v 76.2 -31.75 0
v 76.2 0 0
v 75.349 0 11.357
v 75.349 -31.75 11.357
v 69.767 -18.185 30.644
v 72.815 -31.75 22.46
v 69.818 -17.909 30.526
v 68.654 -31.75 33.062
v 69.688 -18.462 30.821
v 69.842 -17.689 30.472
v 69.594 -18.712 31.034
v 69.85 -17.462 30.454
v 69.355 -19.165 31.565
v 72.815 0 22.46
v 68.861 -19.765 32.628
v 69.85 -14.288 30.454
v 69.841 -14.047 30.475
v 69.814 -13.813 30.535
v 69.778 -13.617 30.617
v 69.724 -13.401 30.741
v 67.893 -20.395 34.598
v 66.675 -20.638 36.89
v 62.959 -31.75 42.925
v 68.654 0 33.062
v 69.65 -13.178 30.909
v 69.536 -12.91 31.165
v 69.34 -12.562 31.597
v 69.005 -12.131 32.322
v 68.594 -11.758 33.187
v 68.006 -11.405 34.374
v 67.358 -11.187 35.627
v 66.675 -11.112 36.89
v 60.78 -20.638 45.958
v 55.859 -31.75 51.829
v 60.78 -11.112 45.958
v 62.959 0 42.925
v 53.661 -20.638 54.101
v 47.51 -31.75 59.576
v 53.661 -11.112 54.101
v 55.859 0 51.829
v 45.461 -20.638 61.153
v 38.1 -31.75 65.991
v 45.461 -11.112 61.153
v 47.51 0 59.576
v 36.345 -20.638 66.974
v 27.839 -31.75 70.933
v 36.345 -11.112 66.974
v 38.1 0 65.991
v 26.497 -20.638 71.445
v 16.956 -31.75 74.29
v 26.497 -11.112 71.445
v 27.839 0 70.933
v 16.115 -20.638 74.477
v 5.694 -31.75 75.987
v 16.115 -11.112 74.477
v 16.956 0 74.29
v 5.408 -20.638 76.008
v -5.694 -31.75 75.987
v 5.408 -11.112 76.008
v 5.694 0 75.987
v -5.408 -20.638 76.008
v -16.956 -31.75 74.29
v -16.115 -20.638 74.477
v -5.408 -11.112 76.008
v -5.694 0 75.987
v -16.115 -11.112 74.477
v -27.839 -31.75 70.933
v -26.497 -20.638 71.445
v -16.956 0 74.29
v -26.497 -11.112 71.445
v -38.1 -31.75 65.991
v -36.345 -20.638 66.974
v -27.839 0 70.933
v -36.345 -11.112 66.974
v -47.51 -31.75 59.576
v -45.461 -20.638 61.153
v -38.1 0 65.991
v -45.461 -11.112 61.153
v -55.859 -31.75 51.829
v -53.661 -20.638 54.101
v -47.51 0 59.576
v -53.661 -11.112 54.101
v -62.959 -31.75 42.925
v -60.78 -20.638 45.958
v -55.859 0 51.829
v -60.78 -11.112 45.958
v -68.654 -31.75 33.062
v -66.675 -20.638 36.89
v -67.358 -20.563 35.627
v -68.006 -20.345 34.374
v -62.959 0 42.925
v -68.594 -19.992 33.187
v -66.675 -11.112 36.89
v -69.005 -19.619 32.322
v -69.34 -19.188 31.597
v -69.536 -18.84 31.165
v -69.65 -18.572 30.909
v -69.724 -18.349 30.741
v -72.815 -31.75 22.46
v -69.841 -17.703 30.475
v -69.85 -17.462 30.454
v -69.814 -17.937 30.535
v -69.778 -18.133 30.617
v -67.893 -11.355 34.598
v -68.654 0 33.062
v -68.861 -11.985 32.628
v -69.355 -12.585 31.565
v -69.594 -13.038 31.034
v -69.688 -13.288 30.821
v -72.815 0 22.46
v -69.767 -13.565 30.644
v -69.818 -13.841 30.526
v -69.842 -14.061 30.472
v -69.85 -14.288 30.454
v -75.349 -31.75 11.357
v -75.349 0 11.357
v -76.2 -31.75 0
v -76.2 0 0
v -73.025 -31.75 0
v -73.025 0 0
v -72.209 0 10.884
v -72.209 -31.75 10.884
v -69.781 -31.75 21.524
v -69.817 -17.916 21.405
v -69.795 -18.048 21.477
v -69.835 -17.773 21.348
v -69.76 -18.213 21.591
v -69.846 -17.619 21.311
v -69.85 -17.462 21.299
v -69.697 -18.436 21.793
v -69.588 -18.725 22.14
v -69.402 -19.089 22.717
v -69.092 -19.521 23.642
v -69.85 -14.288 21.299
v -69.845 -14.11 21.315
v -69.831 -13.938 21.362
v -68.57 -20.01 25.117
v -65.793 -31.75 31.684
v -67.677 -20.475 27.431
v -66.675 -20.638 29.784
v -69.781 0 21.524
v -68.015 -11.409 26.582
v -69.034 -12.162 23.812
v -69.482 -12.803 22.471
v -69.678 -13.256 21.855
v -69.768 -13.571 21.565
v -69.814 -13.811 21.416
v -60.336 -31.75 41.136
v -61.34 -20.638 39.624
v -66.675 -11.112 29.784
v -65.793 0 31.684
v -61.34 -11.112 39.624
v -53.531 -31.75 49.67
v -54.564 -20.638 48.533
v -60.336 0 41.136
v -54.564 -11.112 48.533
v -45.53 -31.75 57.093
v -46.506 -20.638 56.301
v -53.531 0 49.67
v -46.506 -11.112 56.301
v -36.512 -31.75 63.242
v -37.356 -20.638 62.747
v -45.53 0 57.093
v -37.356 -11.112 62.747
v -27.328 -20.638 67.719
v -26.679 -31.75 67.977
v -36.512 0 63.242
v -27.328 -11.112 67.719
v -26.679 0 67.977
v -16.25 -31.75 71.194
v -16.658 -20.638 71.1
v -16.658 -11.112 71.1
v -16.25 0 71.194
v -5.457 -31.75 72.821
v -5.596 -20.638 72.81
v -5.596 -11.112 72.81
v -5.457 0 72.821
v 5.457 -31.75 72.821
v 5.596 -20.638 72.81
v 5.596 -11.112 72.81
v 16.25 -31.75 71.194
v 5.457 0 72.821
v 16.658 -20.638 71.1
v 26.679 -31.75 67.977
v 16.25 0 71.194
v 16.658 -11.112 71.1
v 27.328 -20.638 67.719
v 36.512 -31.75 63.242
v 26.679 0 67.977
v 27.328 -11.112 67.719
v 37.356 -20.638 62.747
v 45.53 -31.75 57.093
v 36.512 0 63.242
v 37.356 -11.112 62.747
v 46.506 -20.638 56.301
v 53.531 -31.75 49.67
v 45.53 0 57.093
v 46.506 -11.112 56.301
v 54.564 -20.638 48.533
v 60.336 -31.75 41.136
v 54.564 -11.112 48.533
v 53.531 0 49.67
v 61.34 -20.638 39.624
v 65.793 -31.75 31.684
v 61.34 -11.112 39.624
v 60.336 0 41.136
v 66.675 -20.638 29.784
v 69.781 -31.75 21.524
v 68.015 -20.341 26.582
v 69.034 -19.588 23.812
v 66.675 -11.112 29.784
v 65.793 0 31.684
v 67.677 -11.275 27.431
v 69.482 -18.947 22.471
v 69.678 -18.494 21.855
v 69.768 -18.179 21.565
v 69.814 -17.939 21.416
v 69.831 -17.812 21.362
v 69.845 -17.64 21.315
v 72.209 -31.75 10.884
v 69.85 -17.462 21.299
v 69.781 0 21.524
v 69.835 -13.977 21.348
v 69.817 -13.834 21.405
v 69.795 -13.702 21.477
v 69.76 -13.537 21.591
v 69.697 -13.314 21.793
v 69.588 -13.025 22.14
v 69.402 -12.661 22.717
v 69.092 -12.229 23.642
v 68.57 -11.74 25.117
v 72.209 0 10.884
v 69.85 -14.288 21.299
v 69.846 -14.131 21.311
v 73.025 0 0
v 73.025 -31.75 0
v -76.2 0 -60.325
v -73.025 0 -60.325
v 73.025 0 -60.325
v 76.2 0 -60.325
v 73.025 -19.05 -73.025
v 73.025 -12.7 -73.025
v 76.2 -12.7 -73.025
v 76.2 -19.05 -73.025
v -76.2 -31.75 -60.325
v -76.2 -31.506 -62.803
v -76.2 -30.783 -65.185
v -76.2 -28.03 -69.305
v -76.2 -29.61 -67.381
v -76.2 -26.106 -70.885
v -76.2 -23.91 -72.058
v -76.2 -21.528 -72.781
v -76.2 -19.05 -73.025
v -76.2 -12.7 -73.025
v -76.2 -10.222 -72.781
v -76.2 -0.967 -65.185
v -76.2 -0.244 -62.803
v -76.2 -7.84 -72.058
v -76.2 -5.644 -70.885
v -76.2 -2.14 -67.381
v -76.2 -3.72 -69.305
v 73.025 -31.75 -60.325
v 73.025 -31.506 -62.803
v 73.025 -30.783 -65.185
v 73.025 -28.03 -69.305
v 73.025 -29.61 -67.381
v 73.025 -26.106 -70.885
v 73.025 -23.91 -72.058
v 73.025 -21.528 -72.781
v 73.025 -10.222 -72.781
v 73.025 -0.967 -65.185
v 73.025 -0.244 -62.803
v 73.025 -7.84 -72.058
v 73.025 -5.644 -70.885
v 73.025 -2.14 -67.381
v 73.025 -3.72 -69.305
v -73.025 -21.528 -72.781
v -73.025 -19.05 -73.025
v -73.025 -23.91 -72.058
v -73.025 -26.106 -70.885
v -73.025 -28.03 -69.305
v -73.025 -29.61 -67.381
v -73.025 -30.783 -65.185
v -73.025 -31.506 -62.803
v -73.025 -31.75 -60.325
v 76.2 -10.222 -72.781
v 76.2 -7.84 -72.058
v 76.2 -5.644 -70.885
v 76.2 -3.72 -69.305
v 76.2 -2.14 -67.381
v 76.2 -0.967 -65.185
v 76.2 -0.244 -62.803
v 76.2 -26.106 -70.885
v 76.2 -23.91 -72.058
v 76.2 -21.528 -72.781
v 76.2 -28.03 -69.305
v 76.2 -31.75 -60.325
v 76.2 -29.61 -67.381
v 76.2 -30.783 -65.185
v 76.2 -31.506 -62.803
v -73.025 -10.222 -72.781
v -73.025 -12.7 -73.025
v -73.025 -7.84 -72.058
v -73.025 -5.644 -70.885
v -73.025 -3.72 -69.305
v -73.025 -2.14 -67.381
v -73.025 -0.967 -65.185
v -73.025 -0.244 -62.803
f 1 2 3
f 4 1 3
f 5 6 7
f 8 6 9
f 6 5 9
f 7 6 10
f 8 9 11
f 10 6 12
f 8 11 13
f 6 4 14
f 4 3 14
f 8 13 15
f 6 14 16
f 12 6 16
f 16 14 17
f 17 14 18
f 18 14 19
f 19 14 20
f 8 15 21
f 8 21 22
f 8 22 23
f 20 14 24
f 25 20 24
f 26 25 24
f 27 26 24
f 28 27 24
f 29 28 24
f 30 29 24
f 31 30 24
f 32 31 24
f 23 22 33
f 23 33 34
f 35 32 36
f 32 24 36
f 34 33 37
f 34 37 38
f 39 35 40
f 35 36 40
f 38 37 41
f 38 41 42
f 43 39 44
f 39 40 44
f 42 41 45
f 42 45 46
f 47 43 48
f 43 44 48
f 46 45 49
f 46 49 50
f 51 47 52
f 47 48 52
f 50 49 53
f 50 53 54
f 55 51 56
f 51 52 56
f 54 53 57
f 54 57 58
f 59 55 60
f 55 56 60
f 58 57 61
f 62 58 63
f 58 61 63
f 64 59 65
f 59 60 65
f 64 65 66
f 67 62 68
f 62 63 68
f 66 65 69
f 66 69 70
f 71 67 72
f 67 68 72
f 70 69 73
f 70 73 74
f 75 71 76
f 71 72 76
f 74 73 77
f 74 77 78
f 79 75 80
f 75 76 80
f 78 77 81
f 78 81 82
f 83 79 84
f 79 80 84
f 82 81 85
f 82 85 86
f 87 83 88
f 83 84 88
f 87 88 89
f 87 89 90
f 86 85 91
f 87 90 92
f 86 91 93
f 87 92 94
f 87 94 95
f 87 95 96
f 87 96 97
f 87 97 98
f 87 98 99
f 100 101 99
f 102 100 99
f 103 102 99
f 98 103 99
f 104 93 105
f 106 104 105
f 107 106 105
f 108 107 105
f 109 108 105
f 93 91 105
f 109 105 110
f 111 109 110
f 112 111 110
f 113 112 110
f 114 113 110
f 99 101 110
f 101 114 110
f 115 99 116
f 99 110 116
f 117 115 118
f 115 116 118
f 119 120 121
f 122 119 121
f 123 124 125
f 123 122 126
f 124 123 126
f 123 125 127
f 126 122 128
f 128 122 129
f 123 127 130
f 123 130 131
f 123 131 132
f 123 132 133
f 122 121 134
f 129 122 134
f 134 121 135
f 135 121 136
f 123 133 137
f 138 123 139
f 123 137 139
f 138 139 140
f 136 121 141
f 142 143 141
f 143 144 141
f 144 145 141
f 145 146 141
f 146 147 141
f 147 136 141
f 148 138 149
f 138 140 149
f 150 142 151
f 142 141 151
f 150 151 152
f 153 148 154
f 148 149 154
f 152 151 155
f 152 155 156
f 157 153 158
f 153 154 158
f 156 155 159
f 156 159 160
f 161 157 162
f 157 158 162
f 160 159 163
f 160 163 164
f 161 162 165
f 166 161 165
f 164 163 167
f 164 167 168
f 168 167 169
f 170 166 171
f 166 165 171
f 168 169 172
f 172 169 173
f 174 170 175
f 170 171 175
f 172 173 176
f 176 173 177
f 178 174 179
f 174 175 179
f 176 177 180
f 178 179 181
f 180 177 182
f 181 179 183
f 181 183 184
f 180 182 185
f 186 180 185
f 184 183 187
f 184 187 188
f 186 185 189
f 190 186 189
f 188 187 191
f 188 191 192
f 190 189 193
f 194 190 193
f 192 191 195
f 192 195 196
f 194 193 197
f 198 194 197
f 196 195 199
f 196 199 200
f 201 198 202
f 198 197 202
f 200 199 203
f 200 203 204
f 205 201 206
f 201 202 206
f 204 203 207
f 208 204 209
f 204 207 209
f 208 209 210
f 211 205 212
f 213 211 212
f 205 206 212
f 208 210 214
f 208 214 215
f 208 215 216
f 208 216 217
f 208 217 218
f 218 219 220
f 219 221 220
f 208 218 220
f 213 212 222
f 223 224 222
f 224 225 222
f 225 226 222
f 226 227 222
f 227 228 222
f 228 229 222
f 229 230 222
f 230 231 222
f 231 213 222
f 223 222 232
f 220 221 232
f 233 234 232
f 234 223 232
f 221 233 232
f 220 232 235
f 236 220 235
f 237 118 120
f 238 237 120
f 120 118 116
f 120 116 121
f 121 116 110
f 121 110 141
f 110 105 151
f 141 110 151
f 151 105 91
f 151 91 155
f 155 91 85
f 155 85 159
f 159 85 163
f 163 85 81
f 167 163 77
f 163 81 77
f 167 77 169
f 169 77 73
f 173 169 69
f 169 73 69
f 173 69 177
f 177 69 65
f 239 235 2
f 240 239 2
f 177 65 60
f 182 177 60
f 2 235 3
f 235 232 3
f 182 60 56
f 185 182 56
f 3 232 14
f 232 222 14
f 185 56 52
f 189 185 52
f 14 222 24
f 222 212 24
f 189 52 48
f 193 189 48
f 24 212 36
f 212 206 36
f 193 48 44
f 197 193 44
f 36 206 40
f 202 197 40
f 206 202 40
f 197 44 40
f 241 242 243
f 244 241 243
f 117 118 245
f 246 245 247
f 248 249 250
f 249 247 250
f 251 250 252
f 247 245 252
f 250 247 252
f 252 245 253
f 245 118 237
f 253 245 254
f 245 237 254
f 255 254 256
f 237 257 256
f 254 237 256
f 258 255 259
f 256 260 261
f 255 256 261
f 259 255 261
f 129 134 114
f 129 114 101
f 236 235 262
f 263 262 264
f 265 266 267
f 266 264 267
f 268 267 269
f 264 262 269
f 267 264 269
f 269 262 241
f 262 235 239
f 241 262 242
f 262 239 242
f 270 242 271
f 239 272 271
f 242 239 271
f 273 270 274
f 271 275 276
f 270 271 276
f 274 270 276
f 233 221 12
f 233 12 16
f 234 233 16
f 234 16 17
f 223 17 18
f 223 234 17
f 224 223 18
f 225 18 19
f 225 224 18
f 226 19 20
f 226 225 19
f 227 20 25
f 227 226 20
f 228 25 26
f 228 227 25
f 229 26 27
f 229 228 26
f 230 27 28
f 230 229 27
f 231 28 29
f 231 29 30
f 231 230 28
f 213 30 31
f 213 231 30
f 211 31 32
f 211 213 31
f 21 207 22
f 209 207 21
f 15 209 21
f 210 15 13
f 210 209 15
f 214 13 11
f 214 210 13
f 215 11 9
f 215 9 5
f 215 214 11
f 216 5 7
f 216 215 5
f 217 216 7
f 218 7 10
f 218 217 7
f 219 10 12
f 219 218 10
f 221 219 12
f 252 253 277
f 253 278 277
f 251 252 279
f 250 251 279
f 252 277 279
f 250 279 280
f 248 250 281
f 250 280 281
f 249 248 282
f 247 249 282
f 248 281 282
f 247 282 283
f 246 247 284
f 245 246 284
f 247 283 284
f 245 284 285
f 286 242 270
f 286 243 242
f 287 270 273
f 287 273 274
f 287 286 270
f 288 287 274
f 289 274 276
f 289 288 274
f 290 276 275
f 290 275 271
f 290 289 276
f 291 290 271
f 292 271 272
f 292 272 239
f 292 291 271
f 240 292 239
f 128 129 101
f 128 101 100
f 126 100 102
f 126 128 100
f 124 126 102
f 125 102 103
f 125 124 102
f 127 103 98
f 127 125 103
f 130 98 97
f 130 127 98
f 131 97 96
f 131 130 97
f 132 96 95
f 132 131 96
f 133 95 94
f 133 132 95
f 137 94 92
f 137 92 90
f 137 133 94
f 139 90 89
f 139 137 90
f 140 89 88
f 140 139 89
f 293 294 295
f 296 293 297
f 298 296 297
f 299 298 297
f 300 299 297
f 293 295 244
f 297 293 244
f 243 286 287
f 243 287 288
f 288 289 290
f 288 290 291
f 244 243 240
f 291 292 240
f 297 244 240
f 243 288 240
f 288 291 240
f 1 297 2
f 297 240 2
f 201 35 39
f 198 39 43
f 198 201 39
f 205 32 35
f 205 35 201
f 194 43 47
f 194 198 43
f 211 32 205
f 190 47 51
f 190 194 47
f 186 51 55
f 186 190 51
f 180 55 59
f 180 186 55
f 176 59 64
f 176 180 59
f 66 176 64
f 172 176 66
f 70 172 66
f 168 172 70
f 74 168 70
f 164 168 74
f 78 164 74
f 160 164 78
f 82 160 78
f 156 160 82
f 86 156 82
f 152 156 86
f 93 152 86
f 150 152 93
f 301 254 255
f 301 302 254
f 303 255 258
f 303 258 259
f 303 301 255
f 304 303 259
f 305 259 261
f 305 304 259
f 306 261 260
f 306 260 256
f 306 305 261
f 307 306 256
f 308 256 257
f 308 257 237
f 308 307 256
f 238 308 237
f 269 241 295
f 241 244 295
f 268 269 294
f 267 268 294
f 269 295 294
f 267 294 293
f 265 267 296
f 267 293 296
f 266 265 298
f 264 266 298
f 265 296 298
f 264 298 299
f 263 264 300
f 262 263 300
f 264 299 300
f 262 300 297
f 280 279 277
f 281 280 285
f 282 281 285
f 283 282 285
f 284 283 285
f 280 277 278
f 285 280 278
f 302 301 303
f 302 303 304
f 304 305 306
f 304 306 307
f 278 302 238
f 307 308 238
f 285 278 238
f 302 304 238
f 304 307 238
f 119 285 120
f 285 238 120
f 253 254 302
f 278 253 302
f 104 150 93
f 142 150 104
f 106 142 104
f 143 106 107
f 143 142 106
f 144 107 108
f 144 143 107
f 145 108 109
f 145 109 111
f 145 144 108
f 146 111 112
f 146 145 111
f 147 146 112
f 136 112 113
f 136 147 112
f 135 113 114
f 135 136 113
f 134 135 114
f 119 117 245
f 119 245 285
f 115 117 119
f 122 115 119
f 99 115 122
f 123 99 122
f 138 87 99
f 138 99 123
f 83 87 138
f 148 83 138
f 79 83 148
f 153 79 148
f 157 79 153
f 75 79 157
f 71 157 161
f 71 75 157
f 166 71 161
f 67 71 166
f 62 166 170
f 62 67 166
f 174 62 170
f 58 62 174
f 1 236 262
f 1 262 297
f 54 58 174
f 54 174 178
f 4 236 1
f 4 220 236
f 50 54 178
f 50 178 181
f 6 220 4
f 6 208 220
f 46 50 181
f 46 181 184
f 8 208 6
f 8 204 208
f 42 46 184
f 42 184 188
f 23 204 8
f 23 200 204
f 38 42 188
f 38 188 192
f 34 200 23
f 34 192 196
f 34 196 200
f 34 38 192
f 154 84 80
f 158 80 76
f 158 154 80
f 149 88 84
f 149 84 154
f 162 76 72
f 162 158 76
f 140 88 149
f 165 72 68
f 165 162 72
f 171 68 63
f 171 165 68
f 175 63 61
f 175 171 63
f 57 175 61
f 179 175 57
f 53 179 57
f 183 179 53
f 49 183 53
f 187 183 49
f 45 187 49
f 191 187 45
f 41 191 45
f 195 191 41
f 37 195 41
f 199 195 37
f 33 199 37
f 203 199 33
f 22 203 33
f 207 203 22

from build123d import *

# Parameters (mm, degrees)
F1_DEPTH = 31.75
F2_R     = 12.7
F4_DEPTH = 76.201


with BuildPart() as f1:
    # F0 (on Front) → F1 (new body)
    with BuildSketch(Plane.XZ):
        with BuildLine():
            ThreePointArc((-73.025, 0), (0, 73.025), (73.025, 0))
            Line((73.025, 0), (73.025, -73.025))
            Line((73.025, -73.025), (76.2, -73.025))
            Line((76.2, -73.025), (76.2, 0))
            ThreePointArc((76.2, 0), (0, 76.2), (-76.2, 0))
            Line((-76.2, 0), (-76.2, -73.025))
            Line((-76.2, -73.025), (-73.025, -73.025))
            Line((-73.025, -73.025), (-73.025, 0))
        make_face()
    extrude(amount=F1_DEPTH)

    # F2
    f2_edges = [f1.edges().sort_by_distance(p)[0] for p in [
        (-74.6125, -31.75, -73.025),
        (-74.6125, 0, -73.025),
        (74.6125, -31.75, -73.025),
        (74.6125, 0, -73.025),
    ]]
    fillet(f2_edges, radius=F2_R)

    # F3 (on Top) → F4 (cut, through all)
    with BuildSketch(Plane.XY):
        with BuildLine():
            ThreePointArc((-69.85, -17.4625), (-68.920064, -19.707564), (-66.675, -20.6375))
            Line((-66.675, -20.6375), (66.675, -20.6375))
            ThreePointArc((66.675, -20.6375), (68.920064, -19.707564), (69.85, -17.4625))
            Line((69.85, -17.4625), (69.85, -14.2875))
            ThreePointArc((69.85, -14.2875), (68.920064, -12.042436), (66.675, -11.1125))
            Line((66.675, -11.1125), (-66.675, -11.1125))
            ThreePointArc((-66.675, -11.1125), (-68.920064, -12.042436), (-69.85, -14.2875))
            Line((-69.85, -14.2875), (-69.85, -17.4625))
        make_face()
    extrude(amount=F4_DEPTH, mode=Mode.SUBTRACT)


solid = f1.part
